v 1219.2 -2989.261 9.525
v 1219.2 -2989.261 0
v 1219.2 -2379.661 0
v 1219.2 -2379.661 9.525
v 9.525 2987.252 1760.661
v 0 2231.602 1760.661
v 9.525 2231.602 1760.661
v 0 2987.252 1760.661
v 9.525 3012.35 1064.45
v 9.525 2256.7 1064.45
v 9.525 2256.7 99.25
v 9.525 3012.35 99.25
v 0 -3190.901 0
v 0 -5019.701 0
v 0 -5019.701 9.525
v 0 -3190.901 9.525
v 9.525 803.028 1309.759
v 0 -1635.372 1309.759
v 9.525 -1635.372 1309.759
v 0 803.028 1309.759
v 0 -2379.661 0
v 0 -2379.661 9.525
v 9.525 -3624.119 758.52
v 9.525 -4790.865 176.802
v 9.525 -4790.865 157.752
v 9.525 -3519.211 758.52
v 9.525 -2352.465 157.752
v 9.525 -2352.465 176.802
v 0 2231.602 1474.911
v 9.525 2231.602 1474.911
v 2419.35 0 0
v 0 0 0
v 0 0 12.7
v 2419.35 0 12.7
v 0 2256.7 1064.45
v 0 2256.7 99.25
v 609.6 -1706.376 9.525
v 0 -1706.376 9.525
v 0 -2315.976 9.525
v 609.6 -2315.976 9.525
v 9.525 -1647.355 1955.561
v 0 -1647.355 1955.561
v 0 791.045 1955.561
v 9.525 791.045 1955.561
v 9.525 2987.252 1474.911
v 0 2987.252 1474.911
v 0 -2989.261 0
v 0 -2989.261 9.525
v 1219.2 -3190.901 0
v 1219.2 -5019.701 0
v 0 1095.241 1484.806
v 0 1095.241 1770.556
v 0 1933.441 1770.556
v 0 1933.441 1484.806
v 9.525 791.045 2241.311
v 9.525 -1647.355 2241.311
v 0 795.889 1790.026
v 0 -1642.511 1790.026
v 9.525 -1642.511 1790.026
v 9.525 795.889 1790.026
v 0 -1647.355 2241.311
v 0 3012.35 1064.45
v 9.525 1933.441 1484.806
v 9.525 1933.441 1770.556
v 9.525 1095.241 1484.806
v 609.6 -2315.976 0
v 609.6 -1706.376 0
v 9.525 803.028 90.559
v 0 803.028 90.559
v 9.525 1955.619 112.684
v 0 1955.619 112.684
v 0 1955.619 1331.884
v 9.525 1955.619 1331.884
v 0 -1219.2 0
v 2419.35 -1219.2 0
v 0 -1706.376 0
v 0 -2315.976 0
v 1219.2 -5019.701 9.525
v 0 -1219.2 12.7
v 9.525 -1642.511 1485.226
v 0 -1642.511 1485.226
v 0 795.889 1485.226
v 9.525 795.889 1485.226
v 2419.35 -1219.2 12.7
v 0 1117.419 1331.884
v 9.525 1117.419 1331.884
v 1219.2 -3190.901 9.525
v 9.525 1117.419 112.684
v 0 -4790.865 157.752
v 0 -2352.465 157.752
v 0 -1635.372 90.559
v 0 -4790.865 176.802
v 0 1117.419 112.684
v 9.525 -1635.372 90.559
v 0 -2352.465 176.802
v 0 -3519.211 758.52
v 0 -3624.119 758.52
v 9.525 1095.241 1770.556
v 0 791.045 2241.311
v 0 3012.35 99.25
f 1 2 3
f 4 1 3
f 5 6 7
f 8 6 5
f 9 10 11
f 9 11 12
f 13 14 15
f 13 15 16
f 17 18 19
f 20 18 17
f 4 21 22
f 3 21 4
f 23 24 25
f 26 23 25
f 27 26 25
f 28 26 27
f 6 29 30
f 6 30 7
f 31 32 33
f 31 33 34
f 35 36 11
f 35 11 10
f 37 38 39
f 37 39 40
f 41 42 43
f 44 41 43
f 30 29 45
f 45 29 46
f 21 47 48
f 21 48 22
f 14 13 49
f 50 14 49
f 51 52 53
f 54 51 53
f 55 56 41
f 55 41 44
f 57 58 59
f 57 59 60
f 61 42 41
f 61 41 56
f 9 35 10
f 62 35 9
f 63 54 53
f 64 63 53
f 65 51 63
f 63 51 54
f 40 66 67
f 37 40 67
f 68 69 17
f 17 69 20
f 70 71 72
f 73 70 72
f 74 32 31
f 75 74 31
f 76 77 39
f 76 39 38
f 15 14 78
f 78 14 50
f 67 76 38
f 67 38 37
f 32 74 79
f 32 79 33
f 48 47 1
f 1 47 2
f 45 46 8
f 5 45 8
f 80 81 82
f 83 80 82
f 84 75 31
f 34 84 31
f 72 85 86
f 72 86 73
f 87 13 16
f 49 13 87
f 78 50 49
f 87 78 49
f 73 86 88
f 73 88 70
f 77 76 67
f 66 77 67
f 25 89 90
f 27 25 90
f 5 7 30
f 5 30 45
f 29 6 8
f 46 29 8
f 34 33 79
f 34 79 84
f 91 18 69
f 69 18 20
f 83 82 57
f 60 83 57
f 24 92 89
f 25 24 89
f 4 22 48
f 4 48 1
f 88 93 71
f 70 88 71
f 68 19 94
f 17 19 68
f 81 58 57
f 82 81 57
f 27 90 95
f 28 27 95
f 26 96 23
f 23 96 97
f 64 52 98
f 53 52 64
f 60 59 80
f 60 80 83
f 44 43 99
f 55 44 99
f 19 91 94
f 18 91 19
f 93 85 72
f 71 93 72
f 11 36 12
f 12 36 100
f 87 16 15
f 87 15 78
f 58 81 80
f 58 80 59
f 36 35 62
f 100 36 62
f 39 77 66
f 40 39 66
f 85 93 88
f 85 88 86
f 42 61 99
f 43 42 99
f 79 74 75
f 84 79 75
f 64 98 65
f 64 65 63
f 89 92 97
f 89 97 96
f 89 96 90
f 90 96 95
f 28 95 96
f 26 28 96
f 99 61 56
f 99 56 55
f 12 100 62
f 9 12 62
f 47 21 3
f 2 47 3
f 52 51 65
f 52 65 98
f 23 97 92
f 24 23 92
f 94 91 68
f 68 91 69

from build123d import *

# Parameters (mm, degrees)
F0_W      = 2419.35
F0_H      = 1219.2
F1_DEPTH  = 12.7
F2_W      = 2438.4
F2_H      = 1219.2
F3_DEPTH  = 9.525
F4_W      = 2438.4
F4_H      = 304.8
F5_DEPTH  = 9.525
F6_W      = 838.2
F6_H      = 1219.2
F7_DEPTH  = 9.525
F8_W      = 755.65
F8_H      = 965.2
F9_DEPTH  = 9.525
F10_W     = 838.2
F10_H     = 285.75
F11_DEPTH = 9.525
F12_W     = 755.65
F12_H     = 285.75
F13_DEPTH = 9.525
F15_W     = 1219.2
F15_H     = 1828.8
F16_DEPTH = 9.525
F14_W     = 1219.2
F14_H     = 609.6
F17_DEPTH = 9.525
F18_W     = 609.6
F18_H     = 609.6
F19_DEPTH = 9.525
F21_DEPTH = 9.525
F22_W     = 2438.4
F22_H     = 285.75
F23_DEPTH = 9.525


with BuildPart() as f1:
    # F0 (on Top) → F1 (new body)
    with BuildSketch(Plane.XY):
        with Locations((1209.675, -609.6)):
            Rectangle(F0_W, F0_H)
    extrude(amount=F1_DEPTH)


with BuildPart() as f3:
    # F2 (on Right) → F3 (new body)
    with BuildSketch(Plane.YZ):
        with Locations((-416.17161, 700.159263)):
            Rectangle(F2_W, F2_H)
    extrude(amount=F3_DEPTH)


with BuildPart() as f5:
    # F4 (on Right) → F5 (new body)
    with BuildSketch(Plane.YZ):
        with Locations((-423.311144, 1637.625886)):
            Rectangle(F4_W, F4_H)
    extrude(amount=F5_DEPTH)


with BuildPart() as f7:
    # F6 (on Right) → F7 (new body)
    with BuildSketch(Plane.YZ):
        with Locations((1536.51911, 722.284046)):
            Rectangle(F6_W, F6_H)
    extrude(amount=F7_DEPTH)


with BuildPart() as f9:
    # F8 (on Right) → F9 (new body)
    with BuildSketch(Plane.YZ):
        with Locations((2634.524822, 581.849857)):
            Rectangle(F8_W, F8_H)
    extrude(amount=F9_DEPTH)


with BuildPart() as f11:
    # F10 (on Right) → F11 (new body)
    with BuildSketch(Plane.YZ):
        with Locations((1514.340671, 1627.681018)):
            Rectangle(F10_W, F10_H)
    extrude(amount=F11_DEPTH)


with BuildPart() as f13:
    # F12 (on Right) → F13 (new body)
    with BuildSketch(Plane.YZ):
        with Locations((2609.427483, 1617.785812)):
            Rectangle(F12_W, F12_H)
    extrude(amount=F13_DEPTH)


with BuildPart() as f16:
    # F15 (on Top) → F16 (new body)
    with BuildSketch(Plane.XY):
        with Locations((609.6, -4105.301192)):
            Rectangle(F15_W, F15_H)
    extrude(amount=F16_DEPTH)


with BuildPart() as f17:
    # F14 (on Top) → F17 (new body)
    with BuildSketch(Plane.XY):
        with Locations((609.6, -2684.461389)):
            Rectangle(F14_W, F14_H)
    extrude(amount=F17_DEPTH)


with BuildPart() as f19:
    # F18 (on Top) → F19 (new body)
    with BuildSketch(Plane.XY):
        with Locations((304.8, -2011.175764)):
            Rectangle(F18_W, F18_H)
    extrude(amount=F19_DEPTH)


with BuildPart() as f21:
    # F20 (on Right) → F21 (new body)
    with BuildSketch(Plane.YZ):
        Polygon((-3624.118958, 758.520031), (-4790.864929, 176.801948), (-4790.864929, 157.751948), (-2352.464929, 157.751948), (-2352.464929, 176.801948), (-3519.210901, 758.520031), align=None)
    extrude(amount=F21_DEPTH)


with BuildPart() as f23:
    # F22 (on Right) → F23 (new body)
    with BuildSketch(Plane.YZ):
        with Locations((-428.155303, 2098.436329)):
            Rectangle(F22_W, F22_H)
    extrude(amount=F23_DEPTH)


solid = Compound([f1.part, f3.part, f5.part, f7.part, f9.part, f11.part, f13.part, f16.part, f17.part, f19.part, f21.part, f23.part])
